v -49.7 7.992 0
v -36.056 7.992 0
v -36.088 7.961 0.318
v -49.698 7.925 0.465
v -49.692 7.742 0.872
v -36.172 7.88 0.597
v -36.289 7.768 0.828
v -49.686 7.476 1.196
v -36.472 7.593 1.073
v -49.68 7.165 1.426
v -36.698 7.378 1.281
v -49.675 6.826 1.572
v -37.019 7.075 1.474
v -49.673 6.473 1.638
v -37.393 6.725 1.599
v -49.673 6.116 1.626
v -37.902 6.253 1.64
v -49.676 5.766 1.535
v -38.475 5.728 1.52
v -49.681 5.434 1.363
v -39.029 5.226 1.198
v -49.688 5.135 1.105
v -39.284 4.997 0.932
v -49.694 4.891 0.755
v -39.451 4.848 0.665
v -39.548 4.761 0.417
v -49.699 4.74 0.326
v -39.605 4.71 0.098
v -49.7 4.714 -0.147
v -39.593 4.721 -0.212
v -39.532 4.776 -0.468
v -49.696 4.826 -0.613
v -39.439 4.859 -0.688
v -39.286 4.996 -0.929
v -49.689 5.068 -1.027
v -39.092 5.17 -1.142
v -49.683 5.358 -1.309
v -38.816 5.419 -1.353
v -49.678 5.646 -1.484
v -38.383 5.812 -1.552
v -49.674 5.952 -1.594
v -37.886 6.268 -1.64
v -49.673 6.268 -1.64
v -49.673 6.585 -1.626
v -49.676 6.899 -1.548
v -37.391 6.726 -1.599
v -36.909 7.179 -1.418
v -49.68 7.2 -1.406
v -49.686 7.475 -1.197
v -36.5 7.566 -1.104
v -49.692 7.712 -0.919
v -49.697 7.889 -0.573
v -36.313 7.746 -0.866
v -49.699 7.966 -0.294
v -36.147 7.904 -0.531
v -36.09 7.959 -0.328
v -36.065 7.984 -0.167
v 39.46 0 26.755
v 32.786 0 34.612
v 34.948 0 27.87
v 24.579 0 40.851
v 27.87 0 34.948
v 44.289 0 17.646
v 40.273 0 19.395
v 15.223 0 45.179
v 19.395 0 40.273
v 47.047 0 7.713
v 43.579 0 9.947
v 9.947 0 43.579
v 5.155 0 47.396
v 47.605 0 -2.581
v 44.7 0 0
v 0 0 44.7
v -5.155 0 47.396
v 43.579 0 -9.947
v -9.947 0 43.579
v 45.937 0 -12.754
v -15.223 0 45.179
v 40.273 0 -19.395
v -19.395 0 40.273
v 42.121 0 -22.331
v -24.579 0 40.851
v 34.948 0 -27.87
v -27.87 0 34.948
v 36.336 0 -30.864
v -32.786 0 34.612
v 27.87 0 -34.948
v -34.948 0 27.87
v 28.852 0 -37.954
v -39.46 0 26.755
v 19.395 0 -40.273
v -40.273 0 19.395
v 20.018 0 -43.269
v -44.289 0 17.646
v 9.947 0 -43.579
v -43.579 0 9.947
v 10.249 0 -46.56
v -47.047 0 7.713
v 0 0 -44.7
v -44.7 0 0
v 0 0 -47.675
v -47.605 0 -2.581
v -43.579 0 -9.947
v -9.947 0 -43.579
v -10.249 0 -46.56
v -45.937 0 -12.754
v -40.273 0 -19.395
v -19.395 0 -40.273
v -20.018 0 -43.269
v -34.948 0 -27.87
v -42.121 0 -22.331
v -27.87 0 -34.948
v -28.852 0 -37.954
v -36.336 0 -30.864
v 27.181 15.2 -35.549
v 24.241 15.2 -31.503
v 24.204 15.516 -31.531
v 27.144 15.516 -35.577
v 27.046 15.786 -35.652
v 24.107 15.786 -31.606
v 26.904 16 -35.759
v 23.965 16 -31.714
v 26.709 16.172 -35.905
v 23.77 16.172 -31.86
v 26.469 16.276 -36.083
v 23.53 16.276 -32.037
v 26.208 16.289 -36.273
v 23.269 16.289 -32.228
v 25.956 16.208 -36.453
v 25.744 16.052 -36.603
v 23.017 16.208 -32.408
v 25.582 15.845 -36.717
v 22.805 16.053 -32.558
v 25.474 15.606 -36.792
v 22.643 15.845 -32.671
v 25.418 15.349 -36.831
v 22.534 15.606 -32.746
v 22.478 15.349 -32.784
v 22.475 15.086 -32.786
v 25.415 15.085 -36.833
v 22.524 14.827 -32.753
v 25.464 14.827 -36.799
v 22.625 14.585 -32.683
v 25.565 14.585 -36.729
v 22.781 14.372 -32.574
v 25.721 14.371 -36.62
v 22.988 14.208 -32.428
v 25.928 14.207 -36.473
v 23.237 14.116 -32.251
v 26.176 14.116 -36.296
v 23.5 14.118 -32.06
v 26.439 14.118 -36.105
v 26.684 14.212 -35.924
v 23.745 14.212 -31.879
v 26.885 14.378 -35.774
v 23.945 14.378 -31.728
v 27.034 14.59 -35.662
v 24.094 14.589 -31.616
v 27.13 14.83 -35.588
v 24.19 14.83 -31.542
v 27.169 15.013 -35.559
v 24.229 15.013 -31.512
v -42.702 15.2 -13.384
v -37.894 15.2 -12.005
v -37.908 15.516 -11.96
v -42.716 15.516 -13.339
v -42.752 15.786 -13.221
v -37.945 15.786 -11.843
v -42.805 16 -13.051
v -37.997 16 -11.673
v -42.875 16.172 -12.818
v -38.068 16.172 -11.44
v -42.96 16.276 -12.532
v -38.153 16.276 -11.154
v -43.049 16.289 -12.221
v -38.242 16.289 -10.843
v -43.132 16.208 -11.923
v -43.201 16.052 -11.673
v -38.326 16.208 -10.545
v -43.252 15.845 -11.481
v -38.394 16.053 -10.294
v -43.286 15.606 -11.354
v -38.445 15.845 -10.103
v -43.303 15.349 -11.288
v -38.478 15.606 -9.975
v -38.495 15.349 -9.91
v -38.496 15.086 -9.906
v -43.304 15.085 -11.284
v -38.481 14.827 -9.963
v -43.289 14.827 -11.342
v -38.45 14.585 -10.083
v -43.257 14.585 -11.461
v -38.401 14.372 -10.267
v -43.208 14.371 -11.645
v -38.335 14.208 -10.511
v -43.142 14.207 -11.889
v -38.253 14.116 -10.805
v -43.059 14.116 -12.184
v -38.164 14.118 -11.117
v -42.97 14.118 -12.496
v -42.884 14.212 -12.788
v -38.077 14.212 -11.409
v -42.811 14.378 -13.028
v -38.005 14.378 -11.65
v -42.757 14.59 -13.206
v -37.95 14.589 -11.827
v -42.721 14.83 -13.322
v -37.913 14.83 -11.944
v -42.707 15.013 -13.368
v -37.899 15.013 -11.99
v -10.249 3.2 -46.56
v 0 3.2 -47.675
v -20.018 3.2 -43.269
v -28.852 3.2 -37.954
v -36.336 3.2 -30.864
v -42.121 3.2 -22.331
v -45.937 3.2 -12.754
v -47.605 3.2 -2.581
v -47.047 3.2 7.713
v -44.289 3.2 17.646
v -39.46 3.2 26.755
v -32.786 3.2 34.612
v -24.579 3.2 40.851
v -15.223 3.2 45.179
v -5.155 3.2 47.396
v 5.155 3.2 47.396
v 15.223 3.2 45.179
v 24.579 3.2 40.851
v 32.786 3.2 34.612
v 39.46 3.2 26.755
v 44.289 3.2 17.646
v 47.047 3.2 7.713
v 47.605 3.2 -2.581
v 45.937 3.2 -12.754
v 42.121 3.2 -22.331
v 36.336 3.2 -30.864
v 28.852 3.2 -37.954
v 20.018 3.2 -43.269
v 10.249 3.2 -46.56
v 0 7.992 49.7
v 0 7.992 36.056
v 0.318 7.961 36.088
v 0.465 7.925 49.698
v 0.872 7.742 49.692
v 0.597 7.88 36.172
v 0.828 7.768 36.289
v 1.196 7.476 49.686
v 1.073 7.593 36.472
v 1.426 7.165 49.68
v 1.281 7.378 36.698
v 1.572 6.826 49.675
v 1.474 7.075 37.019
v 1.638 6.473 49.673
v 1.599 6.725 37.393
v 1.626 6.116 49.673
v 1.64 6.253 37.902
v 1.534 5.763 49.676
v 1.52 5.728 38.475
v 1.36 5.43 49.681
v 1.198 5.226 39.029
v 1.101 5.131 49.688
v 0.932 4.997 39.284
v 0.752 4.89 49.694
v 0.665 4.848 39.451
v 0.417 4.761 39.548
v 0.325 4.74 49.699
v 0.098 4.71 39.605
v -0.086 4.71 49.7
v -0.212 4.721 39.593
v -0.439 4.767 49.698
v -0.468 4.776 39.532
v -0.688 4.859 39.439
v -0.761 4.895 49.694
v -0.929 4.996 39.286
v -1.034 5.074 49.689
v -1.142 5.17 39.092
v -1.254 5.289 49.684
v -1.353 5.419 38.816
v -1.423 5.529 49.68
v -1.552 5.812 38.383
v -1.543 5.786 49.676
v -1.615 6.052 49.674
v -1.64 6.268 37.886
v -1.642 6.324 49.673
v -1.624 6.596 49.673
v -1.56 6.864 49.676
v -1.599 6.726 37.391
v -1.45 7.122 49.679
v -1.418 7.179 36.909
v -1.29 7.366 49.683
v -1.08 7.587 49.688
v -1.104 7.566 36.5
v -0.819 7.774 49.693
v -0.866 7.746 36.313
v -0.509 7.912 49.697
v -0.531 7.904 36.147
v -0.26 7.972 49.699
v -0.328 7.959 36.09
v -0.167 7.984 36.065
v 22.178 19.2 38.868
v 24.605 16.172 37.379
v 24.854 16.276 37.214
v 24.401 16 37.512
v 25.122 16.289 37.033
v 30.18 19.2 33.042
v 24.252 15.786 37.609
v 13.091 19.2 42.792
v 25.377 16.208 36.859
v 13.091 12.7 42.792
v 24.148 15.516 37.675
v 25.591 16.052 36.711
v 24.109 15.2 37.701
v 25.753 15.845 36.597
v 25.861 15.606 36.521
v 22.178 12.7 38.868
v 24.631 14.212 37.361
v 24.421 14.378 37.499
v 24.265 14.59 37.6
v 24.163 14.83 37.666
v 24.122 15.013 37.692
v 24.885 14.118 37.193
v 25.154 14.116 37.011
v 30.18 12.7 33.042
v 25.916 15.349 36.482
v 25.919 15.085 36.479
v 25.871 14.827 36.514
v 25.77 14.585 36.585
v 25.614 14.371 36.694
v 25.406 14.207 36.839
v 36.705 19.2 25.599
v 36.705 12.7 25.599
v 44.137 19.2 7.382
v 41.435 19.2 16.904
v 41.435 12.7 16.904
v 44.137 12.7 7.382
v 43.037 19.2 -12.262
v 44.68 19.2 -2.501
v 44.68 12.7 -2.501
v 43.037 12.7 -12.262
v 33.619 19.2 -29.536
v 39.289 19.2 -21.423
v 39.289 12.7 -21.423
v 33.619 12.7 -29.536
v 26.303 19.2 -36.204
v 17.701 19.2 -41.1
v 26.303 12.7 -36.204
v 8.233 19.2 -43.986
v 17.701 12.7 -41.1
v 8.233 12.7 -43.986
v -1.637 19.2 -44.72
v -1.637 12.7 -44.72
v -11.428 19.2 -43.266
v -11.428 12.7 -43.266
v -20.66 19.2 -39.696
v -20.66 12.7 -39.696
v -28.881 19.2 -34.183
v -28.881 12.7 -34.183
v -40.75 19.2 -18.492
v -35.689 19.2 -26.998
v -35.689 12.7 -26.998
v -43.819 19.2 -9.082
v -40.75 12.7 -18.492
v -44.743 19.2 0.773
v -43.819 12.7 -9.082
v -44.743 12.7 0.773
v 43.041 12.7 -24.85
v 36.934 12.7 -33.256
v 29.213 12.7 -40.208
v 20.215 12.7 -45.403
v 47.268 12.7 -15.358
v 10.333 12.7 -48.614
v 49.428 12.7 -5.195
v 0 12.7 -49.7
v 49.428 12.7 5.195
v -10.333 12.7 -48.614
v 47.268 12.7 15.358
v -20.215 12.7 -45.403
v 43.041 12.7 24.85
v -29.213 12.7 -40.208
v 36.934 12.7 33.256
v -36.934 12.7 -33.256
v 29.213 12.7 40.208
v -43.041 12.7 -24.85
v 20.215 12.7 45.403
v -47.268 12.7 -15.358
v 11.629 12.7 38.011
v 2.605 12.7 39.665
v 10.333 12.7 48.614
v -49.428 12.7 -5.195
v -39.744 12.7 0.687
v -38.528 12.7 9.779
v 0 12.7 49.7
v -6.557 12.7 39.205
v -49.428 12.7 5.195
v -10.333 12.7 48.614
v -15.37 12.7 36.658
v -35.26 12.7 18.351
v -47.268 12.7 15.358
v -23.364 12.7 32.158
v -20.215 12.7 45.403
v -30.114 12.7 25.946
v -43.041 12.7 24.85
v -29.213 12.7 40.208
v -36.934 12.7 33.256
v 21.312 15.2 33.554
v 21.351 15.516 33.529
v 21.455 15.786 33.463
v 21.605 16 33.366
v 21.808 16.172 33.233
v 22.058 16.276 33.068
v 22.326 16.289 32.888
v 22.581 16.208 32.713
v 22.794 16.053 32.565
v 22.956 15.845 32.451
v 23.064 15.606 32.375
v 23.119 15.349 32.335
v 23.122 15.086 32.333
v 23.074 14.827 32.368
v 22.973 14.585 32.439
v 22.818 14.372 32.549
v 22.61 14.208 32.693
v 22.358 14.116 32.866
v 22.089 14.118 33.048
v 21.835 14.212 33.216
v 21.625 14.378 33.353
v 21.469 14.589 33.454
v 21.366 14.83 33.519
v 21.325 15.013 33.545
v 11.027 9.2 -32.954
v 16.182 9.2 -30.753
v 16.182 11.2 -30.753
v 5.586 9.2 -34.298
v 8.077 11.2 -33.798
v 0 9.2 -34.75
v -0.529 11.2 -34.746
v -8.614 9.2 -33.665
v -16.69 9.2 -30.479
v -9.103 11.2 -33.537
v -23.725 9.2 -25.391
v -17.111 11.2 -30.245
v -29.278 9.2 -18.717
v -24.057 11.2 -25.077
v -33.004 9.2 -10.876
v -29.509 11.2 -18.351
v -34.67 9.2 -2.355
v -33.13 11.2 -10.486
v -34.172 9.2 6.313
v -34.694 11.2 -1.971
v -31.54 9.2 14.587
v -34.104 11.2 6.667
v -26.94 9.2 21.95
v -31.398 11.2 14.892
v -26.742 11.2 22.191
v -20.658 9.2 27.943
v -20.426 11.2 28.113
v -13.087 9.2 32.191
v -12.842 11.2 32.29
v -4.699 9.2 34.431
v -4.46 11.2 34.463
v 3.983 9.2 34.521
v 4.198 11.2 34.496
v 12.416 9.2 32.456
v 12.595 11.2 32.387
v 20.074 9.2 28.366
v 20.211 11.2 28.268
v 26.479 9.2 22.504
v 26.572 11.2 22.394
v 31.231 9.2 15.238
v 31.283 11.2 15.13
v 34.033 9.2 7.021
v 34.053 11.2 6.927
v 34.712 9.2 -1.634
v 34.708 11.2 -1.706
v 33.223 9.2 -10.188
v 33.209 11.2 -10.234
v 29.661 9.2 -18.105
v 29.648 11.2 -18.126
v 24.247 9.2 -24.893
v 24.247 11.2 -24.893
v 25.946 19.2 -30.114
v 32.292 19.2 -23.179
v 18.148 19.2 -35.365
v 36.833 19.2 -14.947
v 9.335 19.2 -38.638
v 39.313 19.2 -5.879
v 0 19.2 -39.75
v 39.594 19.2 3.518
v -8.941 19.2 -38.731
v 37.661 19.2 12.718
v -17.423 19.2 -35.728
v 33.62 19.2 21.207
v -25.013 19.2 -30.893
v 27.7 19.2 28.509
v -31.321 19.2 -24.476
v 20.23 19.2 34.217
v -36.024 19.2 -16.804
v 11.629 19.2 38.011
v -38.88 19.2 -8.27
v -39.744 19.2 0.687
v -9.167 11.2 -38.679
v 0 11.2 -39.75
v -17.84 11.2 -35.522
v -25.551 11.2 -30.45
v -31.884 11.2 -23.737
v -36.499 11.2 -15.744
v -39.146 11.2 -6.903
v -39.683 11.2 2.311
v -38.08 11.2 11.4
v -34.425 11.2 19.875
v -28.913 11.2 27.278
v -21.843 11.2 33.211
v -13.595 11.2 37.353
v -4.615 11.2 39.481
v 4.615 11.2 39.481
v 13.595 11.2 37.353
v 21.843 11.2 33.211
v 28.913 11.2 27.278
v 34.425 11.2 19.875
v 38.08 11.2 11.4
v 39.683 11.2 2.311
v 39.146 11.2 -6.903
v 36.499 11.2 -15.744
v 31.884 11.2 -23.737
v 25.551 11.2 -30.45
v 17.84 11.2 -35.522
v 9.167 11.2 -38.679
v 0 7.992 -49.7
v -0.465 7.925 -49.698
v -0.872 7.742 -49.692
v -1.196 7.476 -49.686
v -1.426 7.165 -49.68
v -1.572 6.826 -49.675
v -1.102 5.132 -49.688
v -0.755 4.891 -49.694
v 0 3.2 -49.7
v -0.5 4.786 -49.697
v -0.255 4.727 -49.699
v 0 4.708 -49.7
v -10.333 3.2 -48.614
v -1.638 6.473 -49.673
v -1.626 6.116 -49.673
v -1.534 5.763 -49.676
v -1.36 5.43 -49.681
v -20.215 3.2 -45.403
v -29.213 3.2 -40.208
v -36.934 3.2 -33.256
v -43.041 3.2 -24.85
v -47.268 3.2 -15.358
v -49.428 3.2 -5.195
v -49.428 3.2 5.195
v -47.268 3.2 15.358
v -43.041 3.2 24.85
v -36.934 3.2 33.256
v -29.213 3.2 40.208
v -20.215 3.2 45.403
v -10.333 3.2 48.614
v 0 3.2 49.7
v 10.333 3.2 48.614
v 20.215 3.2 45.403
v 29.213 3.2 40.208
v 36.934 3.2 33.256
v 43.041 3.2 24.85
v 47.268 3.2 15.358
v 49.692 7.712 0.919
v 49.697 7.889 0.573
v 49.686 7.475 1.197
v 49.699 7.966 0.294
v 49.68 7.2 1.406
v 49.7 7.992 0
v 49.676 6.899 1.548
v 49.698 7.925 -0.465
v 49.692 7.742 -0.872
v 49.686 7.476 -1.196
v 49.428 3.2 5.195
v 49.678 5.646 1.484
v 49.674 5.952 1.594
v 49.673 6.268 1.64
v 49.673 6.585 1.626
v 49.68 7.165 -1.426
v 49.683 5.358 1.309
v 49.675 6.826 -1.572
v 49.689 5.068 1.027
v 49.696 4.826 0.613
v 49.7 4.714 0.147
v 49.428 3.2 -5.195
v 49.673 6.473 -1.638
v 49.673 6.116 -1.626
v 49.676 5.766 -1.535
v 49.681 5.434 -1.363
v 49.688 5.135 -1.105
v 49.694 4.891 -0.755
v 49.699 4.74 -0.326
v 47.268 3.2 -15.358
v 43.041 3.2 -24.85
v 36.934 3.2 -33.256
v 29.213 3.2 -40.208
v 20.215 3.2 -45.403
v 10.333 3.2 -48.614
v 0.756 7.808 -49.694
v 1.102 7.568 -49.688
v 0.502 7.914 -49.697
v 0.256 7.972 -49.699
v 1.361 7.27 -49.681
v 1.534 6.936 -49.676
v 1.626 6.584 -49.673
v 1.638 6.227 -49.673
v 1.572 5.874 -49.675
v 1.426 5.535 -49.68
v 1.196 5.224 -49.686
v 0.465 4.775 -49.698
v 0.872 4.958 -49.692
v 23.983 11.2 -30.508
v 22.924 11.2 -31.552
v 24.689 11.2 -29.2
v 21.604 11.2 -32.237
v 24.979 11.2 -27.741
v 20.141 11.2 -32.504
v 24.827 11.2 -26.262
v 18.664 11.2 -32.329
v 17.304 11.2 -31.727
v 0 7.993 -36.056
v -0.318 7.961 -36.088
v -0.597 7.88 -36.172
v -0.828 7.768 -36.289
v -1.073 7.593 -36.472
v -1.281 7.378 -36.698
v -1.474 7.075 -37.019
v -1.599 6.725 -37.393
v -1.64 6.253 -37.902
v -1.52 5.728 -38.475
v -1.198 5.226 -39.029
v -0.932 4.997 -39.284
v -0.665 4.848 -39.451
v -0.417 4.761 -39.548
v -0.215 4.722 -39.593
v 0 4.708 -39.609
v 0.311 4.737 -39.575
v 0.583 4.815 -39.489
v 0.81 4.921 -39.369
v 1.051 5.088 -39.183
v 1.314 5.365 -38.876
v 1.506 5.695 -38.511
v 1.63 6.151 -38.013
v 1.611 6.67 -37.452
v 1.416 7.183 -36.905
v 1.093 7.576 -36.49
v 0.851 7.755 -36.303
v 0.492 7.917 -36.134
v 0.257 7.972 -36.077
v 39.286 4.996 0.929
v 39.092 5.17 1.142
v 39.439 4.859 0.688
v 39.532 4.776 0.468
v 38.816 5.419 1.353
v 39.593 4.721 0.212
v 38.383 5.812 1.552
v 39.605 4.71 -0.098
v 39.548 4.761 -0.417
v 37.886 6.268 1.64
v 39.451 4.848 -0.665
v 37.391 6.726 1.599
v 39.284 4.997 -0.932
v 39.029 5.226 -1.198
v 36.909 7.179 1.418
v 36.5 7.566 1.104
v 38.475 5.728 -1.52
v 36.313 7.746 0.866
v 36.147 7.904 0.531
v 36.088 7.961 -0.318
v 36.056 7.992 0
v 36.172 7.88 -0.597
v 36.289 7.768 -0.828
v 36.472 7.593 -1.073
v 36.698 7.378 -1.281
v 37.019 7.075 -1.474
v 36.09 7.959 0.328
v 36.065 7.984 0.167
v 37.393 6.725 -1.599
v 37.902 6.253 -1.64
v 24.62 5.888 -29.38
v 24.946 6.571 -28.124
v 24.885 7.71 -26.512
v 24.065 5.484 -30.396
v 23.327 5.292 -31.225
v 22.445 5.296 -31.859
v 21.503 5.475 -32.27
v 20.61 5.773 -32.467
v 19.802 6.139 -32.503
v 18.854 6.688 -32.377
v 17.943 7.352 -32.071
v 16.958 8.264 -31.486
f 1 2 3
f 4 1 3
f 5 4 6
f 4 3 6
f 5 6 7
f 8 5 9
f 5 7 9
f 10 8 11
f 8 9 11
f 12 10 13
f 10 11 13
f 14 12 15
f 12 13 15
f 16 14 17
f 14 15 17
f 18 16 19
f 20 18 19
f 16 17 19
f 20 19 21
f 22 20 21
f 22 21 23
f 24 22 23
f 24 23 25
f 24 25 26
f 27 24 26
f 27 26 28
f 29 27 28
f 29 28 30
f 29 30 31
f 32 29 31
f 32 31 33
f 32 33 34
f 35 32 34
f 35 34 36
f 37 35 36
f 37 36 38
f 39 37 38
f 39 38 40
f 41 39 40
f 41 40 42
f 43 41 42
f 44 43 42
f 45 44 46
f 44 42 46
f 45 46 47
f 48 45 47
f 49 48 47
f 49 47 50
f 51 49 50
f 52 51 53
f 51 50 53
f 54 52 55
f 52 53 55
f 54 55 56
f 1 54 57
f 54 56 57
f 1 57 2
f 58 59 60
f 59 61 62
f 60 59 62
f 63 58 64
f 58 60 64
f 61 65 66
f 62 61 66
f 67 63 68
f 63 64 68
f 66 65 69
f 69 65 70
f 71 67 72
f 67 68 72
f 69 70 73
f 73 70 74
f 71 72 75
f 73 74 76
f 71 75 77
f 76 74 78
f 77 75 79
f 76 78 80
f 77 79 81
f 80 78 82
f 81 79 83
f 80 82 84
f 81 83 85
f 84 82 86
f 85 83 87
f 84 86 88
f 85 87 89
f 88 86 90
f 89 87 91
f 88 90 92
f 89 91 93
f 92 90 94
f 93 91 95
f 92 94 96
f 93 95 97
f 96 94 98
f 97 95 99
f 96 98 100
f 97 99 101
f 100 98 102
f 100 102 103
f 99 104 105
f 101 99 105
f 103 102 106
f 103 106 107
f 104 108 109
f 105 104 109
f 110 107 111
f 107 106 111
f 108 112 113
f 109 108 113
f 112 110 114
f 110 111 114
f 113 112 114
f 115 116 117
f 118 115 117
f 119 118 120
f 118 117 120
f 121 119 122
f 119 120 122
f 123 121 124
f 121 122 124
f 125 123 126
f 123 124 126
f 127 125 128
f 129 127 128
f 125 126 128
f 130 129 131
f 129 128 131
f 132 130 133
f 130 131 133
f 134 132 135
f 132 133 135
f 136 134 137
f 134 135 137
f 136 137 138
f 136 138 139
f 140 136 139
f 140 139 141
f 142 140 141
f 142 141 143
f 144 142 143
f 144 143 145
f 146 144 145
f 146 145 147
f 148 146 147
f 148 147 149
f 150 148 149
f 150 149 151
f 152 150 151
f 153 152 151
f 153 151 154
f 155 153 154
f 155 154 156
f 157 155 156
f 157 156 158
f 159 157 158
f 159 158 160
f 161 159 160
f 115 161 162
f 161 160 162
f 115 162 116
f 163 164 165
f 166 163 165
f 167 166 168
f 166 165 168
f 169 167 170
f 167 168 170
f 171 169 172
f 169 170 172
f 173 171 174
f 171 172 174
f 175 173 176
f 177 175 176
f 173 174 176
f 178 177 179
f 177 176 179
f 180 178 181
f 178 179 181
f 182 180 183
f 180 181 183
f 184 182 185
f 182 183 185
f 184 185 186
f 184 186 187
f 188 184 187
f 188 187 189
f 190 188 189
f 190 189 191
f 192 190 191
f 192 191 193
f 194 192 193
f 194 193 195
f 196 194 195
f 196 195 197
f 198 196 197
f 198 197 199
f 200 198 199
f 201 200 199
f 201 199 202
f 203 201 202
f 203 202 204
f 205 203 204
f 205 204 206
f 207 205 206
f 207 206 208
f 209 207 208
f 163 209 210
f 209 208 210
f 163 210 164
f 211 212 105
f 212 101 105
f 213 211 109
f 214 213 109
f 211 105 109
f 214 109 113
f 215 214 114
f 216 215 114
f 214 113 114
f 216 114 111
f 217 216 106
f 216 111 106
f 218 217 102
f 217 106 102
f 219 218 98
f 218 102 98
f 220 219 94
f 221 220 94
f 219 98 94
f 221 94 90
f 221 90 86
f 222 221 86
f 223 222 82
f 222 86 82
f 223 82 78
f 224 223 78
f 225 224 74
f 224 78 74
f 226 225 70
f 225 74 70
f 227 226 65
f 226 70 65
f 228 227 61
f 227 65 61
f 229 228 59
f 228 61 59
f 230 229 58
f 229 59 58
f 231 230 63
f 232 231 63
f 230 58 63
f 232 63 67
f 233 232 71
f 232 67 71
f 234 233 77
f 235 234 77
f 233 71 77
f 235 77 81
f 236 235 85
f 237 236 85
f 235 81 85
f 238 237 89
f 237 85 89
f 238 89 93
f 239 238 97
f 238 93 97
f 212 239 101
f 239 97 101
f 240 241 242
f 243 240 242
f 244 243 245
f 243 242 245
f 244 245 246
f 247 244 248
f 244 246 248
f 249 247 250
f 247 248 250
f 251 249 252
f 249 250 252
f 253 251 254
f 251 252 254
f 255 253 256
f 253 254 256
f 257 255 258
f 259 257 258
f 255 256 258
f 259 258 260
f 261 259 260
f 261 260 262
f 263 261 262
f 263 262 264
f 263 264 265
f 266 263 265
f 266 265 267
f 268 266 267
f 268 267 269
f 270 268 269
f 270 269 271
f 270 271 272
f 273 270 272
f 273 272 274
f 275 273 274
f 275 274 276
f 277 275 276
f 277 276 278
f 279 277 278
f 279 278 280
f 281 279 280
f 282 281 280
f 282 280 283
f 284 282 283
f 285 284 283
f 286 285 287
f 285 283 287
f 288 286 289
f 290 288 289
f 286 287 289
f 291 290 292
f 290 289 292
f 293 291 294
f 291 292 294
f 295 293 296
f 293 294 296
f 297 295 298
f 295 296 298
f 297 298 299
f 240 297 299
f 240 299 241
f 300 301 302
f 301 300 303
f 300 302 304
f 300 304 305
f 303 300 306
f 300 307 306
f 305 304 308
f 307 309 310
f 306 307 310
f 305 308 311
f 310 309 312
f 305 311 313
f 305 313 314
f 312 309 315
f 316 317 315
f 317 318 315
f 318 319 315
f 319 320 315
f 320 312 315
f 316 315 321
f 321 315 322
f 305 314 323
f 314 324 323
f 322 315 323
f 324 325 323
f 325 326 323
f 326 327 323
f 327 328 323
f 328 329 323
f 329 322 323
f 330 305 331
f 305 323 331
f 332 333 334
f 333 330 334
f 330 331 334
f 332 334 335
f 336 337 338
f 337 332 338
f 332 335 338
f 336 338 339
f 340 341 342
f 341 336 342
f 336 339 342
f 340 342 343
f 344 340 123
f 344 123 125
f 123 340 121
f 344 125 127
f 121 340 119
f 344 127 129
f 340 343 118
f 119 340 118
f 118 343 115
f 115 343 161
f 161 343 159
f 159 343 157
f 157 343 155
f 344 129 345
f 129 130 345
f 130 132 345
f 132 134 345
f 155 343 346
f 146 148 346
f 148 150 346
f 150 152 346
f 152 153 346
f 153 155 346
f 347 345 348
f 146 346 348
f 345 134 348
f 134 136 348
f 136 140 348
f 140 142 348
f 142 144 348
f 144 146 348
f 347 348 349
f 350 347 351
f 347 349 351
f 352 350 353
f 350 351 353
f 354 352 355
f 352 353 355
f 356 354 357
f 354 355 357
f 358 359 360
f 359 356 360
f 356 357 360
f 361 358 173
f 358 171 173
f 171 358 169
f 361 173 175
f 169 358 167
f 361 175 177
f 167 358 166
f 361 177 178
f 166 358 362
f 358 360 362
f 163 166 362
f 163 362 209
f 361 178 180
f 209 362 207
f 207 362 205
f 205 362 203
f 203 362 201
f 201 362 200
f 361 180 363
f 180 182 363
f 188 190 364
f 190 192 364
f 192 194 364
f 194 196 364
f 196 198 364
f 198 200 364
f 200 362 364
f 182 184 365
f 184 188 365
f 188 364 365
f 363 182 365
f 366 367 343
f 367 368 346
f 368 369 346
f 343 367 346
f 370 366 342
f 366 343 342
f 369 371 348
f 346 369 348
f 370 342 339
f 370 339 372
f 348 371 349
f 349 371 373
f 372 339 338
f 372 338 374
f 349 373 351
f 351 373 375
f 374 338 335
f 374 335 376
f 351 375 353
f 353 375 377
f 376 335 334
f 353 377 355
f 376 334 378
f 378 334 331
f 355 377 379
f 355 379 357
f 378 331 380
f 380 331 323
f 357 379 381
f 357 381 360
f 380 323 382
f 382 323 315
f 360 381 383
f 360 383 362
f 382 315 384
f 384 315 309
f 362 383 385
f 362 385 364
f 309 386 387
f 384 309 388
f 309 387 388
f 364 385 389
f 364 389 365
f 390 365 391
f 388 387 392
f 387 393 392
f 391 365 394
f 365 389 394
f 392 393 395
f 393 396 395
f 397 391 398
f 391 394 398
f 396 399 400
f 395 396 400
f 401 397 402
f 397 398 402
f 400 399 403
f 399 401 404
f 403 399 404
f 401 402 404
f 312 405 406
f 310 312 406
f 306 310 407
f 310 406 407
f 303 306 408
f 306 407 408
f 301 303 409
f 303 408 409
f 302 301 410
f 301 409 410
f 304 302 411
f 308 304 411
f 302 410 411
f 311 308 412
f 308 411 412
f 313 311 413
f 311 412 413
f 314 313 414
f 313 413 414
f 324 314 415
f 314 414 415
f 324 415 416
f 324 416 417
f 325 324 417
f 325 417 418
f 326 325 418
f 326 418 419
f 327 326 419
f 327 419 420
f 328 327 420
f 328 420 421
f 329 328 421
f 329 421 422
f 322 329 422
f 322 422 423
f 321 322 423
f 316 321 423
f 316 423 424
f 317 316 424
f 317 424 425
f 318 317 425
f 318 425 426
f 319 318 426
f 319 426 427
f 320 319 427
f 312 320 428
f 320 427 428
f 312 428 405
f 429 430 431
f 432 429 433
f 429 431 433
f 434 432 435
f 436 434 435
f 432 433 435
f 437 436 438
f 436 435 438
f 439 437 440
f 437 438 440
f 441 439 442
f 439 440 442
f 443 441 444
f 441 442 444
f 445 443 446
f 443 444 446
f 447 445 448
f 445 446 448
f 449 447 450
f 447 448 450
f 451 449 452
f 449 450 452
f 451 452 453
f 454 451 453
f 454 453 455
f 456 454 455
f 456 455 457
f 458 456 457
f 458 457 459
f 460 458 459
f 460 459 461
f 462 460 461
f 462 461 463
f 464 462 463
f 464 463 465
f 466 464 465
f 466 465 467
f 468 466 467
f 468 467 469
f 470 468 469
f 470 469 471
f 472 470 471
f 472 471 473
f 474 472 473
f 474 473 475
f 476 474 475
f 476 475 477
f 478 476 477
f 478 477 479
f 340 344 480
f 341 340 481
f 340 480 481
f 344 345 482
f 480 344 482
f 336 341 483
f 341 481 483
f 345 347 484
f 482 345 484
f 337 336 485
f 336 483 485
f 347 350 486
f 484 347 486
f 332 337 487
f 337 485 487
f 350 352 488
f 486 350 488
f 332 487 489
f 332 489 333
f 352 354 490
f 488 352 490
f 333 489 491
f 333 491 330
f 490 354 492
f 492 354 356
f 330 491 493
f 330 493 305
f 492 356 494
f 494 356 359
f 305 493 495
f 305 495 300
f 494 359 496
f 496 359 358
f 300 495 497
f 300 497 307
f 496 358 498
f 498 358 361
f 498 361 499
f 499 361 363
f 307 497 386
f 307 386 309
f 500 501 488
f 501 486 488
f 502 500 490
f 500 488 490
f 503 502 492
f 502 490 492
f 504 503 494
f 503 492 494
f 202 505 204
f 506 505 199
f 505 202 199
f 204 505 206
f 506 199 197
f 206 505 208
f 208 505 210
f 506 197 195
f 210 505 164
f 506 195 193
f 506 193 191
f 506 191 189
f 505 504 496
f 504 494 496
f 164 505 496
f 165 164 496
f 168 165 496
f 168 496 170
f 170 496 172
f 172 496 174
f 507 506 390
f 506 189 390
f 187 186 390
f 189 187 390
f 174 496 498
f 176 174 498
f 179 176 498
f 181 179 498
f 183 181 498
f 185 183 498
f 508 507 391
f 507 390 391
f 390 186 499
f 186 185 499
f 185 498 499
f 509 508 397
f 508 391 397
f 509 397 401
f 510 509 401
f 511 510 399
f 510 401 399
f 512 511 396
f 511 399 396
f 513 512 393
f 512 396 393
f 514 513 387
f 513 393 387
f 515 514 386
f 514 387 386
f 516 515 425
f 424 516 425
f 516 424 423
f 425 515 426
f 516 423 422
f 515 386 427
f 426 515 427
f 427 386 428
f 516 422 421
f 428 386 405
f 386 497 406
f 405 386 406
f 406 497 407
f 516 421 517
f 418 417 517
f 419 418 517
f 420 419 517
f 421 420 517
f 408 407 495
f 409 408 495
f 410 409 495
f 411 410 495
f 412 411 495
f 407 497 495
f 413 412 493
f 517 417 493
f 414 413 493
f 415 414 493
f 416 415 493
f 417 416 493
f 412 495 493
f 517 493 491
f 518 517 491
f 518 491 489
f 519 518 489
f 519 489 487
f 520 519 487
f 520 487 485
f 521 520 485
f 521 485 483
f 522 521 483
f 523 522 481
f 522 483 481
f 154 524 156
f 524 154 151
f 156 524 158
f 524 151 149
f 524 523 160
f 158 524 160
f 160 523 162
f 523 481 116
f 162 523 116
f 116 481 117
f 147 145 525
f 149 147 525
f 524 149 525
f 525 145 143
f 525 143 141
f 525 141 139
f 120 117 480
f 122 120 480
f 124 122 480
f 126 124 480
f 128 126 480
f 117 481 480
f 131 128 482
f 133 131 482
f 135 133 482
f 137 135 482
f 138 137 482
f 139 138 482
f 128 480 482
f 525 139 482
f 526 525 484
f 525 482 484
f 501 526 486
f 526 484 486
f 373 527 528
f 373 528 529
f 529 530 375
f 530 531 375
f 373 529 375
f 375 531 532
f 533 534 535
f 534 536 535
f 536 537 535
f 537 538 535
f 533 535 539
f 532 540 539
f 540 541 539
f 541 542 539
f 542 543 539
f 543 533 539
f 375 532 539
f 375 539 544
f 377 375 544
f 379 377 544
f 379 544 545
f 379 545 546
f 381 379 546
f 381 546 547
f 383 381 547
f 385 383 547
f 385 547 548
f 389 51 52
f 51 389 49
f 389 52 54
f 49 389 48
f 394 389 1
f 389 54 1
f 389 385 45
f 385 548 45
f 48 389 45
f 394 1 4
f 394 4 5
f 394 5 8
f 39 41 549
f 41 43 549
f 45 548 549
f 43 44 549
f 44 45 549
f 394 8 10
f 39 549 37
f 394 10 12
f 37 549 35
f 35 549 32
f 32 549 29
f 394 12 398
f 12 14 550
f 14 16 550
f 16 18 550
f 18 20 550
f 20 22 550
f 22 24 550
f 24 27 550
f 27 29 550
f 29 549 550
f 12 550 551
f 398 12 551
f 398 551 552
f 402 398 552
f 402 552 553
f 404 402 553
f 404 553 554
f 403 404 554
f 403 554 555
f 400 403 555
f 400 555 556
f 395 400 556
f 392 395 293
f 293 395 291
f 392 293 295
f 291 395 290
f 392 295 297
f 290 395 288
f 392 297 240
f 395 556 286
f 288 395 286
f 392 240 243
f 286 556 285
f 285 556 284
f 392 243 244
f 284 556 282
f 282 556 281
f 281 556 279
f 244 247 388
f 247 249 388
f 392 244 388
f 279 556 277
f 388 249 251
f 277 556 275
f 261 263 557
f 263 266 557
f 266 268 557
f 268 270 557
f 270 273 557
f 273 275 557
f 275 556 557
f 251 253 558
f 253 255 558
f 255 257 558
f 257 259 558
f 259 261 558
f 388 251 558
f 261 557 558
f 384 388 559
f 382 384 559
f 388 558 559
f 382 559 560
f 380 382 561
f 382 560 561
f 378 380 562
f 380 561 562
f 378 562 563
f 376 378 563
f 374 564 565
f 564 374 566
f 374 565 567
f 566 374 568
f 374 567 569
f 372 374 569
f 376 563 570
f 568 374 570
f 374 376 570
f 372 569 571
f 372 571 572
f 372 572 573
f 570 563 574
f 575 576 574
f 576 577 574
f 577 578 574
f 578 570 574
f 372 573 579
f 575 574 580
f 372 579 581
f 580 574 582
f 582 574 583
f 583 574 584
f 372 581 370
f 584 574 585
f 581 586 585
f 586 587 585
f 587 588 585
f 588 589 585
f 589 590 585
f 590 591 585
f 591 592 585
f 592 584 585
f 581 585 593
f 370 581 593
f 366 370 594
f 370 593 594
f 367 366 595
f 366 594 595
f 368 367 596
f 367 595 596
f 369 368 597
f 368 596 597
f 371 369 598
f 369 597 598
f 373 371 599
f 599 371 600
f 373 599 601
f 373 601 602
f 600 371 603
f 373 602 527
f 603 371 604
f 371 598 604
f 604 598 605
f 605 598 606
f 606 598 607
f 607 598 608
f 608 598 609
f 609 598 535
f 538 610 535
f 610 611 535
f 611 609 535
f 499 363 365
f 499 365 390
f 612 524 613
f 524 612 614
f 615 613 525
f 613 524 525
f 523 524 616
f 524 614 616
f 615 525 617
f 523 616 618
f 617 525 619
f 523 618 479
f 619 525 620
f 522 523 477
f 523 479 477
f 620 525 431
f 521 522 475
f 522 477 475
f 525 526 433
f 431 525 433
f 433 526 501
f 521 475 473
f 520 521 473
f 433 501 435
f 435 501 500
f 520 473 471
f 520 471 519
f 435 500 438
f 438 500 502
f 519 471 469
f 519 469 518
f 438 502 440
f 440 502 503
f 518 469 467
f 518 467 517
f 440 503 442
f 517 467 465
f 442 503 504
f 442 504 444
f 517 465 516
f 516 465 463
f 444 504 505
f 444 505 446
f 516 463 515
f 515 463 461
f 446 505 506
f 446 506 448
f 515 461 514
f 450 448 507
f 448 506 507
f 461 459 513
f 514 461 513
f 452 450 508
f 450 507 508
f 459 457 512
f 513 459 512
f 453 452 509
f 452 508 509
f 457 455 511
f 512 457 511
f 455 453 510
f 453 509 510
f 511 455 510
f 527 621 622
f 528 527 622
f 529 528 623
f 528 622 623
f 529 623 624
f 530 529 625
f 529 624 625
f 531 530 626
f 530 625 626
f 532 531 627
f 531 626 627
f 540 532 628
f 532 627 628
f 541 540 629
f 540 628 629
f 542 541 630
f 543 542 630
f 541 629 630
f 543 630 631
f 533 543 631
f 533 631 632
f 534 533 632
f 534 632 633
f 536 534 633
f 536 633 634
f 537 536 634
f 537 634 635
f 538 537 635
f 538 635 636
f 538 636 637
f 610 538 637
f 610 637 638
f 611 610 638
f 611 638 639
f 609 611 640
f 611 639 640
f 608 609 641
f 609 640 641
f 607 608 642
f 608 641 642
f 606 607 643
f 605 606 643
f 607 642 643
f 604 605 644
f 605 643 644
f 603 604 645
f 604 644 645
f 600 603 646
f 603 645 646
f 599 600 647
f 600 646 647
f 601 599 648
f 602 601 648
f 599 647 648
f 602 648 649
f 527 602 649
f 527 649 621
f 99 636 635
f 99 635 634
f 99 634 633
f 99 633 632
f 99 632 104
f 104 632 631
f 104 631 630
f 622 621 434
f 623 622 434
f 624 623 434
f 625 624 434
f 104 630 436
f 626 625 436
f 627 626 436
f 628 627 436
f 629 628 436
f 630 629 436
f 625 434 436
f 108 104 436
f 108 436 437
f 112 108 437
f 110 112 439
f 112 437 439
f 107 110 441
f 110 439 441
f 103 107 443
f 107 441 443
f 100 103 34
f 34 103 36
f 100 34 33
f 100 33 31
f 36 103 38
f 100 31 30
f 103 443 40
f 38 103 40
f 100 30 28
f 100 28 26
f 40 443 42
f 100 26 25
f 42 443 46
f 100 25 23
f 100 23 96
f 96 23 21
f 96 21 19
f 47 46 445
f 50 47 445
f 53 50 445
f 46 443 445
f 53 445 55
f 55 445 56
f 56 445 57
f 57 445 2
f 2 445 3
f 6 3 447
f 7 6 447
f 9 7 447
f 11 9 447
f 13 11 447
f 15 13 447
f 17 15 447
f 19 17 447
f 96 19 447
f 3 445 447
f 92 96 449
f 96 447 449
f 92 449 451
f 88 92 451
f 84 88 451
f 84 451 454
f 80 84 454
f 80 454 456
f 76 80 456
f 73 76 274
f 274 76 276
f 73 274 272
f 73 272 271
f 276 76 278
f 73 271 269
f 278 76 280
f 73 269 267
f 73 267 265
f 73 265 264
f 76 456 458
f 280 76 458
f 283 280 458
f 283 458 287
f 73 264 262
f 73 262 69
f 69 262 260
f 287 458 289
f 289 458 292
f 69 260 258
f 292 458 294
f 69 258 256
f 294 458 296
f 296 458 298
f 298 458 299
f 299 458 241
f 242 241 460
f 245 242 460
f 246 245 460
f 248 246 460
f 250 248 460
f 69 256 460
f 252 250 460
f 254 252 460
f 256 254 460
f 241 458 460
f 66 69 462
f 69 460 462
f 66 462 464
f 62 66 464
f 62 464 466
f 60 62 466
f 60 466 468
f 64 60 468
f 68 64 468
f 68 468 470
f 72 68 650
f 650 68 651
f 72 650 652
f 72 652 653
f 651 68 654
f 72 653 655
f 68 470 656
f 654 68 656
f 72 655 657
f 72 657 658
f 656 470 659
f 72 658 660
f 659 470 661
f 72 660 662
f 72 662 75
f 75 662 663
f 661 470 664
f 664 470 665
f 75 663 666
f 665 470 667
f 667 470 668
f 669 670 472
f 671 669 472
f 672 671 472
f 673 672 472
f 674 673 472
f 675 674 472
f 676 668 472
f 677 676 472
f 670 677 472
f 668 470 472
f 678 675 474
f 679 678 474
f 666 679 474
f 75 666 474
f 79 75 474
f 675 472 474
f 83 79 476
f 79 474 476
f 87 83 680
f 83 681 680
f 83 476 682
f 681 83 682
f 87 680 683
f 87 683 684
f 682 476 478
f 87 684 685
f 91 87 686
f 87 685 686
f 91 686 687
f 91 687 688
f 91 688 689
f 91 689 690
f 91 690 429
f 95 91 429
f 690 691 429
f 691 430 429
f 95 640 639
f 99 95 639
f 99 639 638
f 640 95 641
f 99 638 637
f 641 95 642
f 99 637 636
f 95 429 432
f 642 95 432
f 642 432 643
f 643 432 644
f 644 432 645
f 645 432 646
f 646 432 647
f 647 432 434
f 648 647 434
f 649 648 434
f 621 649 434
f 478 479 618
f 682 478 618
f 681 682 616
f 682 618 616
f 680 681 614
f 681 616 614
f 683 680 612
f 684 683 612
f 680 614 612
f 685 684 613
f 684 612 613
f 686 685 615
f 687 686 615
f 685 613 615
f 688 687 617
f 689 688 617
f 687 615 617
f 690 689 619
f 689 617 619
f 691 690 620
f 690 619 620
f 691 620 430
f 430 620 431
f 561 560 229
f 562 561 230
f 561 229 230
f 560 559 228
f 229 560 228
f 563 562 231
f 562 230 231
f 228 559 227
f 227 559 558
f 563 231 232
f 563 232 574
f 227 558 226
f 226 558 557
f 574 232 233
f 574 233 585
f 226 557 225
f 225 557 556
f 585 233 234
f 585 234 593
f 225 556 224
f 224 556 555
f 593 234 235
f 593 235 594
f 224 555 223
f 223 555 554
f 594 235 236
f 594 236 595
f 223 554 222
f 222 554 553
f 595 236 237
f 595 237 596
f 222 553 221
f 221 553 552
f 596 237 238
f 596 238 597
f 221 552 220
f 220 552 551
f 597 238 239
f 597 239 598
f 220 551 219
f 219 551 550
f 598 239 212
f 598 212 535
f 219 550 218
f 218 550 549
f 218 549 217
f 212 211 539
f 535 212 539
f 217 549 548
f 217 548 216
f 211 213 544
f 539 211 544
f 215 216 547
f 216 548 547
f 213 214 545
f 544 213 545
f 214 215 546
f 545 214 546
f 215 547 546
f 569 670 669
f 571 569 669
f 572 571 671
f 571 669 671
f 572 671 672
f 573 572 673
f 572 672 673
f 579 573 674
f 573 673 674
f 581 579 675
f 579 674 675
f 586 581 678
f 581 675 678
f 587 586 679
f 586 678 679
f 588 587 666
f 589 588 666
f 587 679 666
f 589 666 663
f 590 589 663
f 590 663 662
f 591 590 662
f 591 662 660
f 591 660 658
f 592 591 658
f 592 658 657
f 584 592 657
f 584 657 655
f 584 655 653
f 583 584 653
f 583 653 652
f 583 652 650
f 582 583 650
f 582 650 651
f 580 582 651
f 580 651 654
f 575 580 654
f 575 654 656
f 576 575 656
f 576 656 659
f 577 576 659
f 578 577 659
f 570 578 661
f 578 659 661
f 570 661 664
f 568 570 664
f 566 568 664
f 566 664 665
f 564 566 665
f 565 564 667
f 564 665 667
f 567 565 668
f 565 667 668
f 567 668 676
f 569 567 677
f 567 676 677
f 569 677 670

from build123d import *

# Parameters (mm, degrees)
SKETCH5_R          = 1.6425
CUT_EXTRUDE1_DEPTH = 50.7
SKETCH6_R          = 1.095
CUT_EXTRUDE2_DEPTH = 70.421071799
CIRPATTERN1_COUNT  = 4
CUT_EXTRUDE3_DEPTH = 6.5
CIRPATTERN2_COUNT  = 2
CIRPATTERN2_ANGLE  = 110
CIRPATTERN3_COUNT  = 2
CIRPATTERN3_ANGLE  = 110
CUT_EXTRUDE5_REACH = 13.2


with BuildPart() as part:
    # Sketch2 → Revolve1 (revolve)
    with BuildSketch(Plane.XY, mode=Mode.PRIVATE) as revolve1_sk:
        Polygon((49.7, 12.7), (49.7, 3.2004), (47.675, 3.2004), (47.675, 0), (44.7, 0), (34.75, 9.2), (34.75, 11.2), (39.75, 11.2), (39.75, 19.2), (44.75, 19.2), (44.75, 12.7), align=None)
    revolve(revolve1_sk.sketch.rotate(Axis((0, 0, 0), (0, 1, 0)), 90), axis=Axis((0, 0, 0), (0, 1, 0)))  # turned: the seam where the file's is

    # Sketch5 → Cut-Extrude1 (cut, through all)
    with BuildSketch(Plane.XY):
        with Locations(Location((0, 6.35, 0), (0, 0, 89.999999821))):  # turned: the seam where the file's is
            Circle(SKETCH5_R)
    cut_extrude1 = extrude(amount=-CUT_EXTRUDE1_DEPTH, mode=Mode.SUBTRACT)

    # Sketch6 → Cut-Extrude2 (cut, through all)
    with BuildSketch(Plane(origin=(0, 0, 0), x_dir=(0.809016994, 0, 0.587785252), z_dir=(-0.587785252, 0, 0.809016994))):
        with Locations((0, 15.2)):
            Circle(SKETCH6_R)
    cut_extrude2 = extrude(amount=-CUT_EXTRUDE2_DEPTH, mode=Mode.SUBTRACT)

    # CirPattern1: Cut-Extrude1 ×4 about axis
    cirpattern1_axis = Axis((0, 13.335, 0), (0, -1, 0))
    for i in range(1, CIRPATTERN1_COUNT):
        add(cut_extrude1.rotate(cirpattern1_axis, i * 360 / CIRPATTERN1_COUNT), mode=Mode.SUBTRACT)

    # Sketch7 → Cut-Extrude3 (cut)
    with BuildSketch(Plane(origin=(0, 19.2, 0), x_dir=(-1, 0, 0), z_dir=(0, 1, 0))):
        with BuildLine():
            Line((44.743322047, 0.773066741), (39.744068187, 0.686690568))
            ThreePointArc((39.744068187, 0.686690568), (23.364463779, 32.158425526), (-11.628510956, 38.011054089))
            Line((-11.628510956, 38.011054089), (-13.091216736, 42.792318754))
            ThreePointArc((-13.091216736, 42.792318754), (26.30339004, 36.203510498), (44.743322047, 0.773066741))
        make_face()
    extrude(amount=-CUT_EXTRUDE3_DEPTH, mode=Mode.SUBTRACT)

    # CirPattern2: Cut-Extrude2 ×2 about axis
    cirpattern2_axis = Axis((0, 13.335, 0), (0, -1, 0))
    for i in range(1, CIRPATTERN2_COUNT):
        add(cut_extrude2.rotate(cirpattern2_axis, i * CIRPATTERN2_ANGLE / (CIRPATTERN2_COUNT - 1)), mode=Mode.SUBTRACT)

    # CirPattern3: Cut-Extrude2 ×2 about axis
    cirpattern3_axis = Axis((0, 13.335, 0), (0, 1, 0))
    for i in range(1, CIRPATTERN3_COUNT):
        add(cut_extrude2.rotate(cirpattern3_axis, i * CIRPATTERN3_ANGLE / (CIRPATTERN3_COUNT - 1)), mode=Mode.SUBTRACT)

    # Cut-Extrude5: up to this cone (the profile starts outside it)
    cut_extrude5_end = Plane(origin=(0, 11.2, 0), z_dir=(0, -1, 0)).offset(-30.130652266) * Cone(1.082e-06, 82.647306238, 76.417608788, align=(Align.CENTER, Align.CENTER, Align.MIN), mode=Mode.PRIVATE)
    # Sketch8 → Cut-Extrude5 (cut, up to the surface)
    with BuildSketch(Plane(origin=(0, 11.2, 0), x_dir=(1, 0, 0), z_dir=(0, 1, 0)), mode=Mode.PRIVATE) as cut_extrude5_sk1:
        with BuildLine():
            Line((16.181580734, 30.752543715), (24.24702365, 24.892656429))
            ThreePointArc((24.24702365, 24.892656429), (22.923624839, 31.551662781), (16.181580734, 30.752543715))
        make_face()
    cut_extrude5_tool1 = extrude(cut_extrude5_sk1.sketch, amount=-CUT_EXTRUDE5_REACH, mode=Mode.PRIVATE) - cut_extrude5_end
    add(cut_extrude5_tool1.solids().sort_by_distance((21.35698, 11.2, -29.395361))[0], mode=Mode.SUBTRACT)


solid = part.part
